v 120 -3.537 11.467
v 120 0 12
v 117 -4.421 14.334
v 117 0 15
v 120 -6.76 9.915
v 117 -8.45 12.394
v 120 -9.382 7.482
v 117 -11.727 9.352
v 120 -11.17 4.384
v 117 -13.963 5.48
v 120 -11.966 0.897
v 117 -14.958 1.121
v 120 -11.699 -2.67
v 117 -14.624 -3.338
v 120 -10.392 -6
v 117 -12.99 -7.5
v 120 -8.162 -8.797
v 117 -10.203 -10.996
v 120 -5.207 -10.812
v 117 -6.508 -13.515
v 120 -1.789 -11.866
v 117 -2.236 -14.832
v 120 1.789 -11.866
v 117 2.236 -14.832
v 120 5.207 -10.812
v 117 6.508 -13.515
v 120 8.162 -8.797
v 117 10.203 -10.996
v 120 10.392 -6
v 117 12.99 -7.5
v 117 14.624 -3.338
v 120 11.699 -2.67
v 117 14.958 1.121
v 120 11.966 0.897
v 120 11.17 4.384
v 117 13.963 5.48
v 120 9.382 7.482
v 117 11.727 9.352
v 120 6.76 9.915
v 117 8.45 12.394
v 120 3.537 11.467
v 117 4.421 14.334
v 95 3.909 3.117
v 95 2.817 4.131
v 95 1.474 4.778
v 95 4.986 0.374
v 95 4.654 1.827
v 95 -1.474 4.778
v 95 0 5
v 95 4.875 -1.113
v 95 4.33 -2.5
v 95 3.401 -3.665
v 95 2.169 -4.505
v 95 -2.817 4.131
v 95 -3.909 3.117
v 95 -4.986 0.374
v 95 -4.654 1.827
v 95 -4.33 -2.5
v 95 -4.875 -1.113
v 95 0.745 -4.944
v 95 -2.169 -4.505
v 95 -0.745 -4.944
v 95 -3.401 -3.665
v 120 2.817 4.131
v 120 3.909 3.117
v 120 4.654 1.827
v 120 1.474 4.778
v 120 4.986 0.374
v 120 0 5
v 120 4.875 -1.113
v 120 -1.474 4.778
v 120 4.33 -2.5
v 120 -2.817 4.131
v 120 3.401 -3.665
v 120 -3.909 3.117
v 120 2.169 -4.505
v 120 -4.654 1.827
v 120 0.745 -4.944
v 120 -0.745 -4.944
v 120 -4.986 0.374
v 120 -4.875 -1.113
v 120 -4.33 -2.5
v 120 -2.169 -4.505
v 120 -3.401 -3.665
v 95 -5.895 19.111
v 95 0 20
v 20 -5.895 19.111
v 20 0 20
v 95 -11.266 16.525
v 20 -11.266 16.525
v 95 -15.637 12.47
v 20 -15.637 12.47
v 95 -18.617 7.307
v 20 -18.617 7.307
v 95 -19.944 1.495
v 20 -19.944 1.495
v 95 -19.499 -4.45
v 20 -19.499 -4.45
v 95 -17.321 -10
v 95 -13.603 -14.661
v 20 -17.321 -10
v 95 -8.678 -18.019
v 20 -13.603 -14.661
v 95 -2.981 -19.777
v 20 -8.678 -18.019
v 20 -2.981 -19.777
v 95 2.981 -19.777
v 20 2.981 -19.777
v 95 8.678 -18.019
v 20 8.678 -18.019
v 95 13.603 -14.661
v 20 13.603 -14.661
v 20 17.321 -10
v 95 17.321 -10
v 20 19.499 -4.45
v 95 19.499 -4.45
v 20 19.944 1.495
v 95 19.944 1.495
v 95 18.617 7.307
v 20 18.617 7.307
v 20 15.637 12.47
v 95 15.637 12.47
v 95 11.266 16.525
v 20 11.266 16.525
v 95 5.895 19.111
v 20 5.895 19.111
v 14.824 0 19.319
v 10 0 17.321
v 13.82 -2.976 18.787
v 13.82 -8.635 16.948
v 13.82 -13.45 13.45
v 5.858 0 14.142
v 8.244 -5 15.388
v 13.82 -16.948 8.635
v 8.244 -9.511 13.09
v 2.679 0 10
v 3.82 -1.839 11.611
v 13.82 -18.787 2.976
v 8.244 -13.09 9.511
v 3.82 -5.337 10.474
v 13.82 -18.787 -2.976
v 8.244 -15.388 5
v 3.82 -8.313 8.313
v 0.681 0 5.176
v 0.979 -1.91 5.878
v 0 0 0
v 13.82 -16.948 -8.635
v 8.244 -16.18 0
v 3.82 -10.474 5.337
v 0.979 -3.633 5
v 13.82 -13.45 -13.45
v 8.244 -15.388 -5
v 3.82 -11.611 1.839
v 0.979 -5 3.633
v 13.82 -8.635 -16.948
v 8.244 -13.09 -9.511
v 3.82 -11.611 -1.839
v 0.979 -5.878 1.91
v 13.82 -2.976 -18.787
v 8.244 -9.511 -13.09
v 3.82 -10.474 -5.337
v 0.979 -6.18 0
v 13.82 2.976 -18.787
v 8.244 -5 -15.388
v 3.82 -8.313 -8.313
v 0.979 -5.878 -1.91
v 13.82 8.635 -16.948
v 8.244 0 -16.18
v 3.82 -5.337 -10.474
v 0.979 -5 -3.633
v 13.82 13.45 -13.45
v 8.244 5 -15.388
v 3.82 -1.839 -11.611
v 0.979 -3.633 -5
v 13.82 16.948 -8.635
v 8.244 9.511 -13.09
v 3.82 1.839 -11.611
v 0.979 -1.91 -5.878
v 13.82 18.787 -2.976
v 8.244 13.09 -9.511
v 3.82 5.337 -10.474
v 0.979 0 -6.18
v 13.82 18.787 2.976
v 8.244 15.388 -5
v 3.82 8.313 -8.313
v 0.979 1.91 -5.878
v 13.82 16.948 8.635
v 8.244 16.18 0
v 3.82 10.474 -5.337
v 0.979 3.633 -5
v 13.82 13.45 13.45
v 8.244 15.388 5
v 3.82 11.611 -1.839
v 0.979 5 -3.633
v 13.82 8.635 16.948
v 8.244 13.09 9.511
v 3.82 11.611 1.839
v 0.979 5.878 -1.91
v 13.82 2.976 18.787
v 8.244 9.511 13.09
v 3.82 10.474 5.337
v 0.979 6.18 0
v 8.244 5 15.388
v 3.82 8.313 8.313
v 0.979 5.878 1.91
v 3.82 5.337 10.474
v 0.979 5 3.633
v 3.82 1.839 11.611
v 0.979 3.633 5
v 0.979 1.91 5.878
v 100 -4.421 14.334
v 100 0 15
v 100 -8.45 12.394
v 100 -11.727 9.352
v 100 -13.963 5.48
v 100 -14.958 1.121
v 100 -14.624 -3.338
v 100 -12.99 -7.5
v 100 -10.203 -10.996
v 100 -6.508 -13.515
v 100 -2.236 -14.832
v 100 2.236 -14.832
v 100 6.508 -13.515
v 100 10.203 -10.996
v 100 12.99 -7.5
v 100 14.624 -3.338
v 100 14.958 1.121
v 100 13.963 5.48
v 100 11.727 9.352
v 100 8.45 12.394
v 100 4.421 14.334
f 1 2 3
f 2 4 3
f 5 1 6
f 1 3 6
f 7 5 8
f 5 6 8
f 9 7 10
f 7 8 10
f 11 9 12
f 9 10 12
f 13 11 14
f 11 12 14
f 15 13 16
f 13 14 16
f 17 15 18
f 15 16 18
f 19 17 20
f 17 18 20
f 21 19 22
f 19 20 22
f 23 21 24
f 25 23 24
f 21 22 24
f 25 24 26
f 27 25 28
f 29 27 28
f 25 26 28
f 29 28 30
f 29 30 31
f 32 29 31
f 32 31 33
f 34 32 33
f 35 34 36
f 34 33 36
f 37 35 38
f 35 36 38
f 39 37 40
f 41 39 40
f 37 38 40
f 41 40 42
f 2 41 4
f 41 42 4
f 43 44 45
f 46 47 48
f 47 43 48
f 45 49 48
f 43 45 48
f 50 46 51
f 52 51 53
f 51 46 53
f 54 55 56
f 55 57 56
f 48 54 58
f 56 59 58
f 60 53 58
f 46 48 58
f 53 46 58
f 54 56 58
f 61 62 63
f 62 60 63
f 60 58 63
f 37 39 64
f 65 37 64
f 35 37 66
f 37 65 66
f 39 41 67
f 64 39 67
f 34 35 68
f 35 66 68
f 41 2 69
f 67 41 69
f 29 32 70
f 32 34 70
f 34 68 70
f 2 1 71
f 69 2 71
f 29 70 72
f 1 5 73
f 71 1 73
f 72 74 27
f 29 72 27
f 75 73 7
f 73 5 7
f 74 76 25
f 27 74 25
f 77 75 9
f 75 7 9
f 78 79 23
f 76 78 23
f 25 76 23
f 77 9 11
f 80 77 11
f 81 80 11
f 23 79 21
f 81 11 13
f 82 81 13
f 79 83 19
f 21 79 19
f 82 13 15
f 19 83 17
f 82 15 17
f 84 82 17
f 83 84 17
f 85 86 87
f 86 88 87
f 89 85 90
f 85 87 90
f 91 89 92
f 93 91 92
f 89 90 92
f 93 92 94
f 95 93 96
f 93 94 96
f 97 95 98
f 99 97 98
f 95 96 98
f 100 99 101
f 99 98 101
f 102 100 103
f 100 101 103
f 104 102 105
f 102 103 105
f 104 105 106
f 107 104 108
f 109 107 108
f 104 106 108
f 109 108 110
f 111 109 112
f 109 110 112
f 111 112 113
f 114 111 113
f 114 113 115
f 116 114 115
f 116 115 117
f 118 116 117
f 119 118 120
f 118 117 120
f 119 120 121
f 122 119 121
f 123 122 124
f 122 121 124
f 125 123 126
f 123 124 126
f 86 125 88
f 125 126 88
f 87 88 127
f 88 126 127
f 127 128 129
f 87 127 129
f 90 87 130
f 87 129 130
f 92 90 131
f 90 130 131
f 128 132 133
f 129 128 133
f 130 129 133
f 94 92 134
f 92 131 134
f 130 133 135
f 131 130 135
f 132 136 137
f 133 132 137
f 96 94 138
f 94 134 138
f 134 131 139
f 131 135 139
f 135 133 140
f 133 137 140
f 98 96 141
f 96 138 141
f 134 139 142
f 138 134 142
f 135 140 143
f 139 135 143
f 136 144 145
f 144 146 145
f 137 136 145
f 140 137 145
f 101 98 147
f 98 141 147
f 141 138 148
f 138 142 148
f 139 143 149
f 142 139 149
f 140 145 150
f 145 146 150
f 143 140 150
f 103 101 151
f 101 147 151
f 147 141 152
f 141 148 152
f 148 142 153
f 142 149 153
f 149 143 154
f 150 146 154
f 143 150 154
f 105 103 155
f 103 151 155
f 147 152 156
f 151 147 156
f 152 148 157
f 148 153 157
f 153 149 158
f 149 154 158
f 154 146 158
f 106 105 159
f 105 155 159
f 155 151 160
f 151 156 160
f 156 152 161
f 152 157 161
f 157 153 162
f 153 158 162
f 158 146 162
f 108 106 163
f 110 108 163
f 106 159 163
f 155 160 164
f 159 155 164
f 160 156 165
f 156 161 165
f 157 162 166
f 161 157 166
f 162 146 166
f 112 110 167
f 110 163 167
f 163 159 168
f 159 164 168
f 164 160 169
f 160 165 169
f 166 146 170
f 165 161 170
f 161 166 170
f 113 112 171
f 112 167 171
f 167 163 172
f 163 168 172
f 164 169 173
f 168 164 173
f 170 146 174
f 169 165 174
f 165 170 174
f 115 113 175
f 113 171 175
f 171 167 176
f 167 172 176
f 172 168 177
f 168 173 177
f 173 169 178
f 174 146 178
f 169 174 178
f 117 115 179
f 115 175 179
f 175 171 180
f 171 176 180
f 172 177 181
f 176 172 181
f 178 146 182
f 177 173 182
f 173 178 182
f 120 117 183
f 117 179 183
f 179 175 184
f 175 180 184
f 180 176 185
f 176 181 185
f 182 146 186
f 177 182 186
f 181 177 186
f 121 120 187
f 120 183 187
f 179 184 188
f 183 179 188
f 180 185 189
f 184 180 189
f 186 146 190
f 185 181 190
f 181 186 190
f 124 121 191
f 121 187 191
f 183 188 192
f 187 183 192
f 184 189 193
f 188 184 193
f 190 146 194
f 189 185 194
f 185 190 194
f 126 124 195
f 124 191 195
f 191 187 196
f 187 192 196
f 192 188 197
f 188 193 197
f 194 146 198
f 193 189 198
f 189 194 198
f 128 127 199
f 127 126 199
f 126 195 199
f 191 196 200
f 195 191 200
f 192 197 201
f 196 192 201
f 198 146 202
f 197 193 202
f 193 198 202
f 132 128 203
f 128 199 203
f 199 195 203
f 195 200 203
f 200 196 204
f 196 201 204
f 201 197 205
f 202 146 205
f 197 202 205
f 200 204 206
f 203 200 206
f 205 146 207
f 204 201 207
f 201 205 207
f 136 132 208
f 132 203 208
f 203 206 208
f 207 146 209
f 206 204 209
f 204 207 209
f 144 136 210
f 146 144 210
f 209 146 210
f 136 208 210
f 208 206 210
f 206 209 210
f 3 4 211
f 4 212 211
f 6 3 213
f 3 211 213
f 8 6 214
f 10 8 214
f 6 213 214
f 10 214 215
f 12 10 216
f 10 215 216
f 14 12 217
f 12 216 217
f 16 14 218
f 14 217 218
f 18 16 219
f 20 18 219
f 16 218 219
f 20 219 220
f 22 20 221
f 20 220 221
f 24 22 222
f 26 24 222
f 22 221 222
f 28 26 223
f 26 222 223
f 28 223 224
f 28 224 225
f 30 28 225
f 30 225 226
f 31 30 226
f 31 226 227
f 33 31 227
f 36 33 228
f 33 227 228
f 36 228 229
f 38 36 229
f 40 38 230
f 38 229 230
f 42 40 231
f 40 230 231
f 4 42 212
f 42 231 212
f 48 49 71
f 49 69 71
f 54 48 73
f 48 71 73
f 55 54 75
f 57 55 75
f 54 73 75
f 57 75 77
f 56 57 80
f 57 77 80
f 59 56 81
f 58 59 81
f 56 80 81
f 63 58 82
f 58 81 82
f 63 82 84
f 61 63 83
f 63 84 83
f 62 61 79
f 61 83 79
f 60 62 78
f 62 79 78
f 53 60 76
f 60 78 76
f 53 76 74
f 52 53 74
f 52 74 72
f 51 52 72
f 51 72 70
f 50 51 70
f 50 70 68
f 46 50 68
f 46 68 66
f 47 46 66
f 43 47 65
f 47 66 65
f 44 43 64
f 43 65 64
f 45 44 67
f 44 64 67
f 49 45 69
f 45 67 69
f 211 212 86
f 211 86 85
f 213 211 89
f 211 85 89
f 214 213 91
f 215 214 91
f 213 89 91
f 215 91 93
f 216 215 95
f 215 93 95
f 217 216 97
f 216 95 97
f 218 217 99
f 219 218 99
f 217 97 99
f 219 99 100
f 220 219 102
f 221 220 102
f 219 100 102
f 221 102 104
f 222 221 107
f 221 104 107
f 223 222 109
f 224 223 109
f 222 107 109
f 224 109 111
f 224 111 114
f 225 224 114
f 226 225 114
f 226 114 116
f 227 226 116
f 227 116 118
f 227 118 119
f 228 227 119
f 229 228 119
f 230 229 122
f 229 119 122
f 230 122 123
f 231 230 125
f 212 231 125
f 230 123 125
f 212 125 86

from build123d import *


with BuildPart() as part:
    # Sketch1 → Revolve1 (revolve)
    with BuildSketch(Plane.XY, mode=Mode.PRIVATE) as revolve1_sk:
        with BuildLine():
            Line((0, 0), (95, 0))
            Line((95, 0), (95, 5))
            Line((95, 5), (120, 5))
            Line((120, 5), (120, 12))
            Line((120, 12), (117, 15))
            Line((117, 15), (100, 15))
            Line((100, 15), (95, 20))
            Line((95, 20), (20, 20))
            ThreePointArc((20, 20), (5.857864376, 14.142135624), (0, 0))
        make_face()
    revolve(revolve1_sk.sketch.rotate(Axis((0, 0, 0), (1, 0, 0)), 90), axis=Axis((0, 0, 0), (1, 0, 0)))


solid = part.part
